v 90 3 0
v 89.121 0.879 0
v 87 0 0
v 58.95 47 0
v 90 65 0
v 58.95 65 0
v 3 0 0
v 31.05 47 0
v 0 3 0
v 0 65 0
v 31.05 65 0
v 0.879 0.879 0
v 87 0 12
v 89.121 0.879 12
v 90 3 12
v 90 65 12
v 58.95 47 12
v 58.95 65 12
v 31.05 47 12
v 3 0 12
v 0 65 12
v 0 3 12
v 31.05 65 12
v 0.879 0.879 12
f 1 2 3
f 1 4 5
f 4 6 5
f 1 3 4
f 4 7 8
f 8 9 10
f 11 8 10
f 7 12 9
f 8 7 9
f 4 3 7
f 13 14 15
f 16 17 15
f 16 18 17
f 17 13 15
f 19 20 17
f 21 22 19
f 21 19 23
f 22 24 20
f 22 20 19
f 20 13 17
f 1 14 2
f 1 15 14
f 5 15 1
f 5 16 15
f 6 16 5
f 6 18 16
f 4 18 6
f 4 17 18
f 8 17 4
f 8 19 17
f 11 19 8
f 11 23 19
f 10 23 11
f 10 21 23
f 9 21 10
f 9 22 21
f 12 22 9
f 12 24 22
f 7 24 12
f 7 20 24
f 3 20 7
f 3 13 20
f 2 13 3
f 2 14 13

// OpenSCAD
$fn = 32;

// ----------------------------------------------------------------------
// Window plate: 90 x 65 mm, 1 open windows
// ----------------------------------------------------------------------

// --- parameters (mm) ---
profile_height = 12;      // extrusion height
profile_points = 12;      // points of the closed outline

profile = [[0, 3], [0.879, 0.879], [3, 0], [87, 0], [89.121, 0.879], [90, 3], [90, 65], [58.95, 65], [58.95, 47], [31.05, 47], [31.05, 65], [0, 65]];  // single closed polygon, 12 points, counter clockwise

// --- the one profile operation ---
linear_extrude(height = profile_height) polygon(points = profile);
